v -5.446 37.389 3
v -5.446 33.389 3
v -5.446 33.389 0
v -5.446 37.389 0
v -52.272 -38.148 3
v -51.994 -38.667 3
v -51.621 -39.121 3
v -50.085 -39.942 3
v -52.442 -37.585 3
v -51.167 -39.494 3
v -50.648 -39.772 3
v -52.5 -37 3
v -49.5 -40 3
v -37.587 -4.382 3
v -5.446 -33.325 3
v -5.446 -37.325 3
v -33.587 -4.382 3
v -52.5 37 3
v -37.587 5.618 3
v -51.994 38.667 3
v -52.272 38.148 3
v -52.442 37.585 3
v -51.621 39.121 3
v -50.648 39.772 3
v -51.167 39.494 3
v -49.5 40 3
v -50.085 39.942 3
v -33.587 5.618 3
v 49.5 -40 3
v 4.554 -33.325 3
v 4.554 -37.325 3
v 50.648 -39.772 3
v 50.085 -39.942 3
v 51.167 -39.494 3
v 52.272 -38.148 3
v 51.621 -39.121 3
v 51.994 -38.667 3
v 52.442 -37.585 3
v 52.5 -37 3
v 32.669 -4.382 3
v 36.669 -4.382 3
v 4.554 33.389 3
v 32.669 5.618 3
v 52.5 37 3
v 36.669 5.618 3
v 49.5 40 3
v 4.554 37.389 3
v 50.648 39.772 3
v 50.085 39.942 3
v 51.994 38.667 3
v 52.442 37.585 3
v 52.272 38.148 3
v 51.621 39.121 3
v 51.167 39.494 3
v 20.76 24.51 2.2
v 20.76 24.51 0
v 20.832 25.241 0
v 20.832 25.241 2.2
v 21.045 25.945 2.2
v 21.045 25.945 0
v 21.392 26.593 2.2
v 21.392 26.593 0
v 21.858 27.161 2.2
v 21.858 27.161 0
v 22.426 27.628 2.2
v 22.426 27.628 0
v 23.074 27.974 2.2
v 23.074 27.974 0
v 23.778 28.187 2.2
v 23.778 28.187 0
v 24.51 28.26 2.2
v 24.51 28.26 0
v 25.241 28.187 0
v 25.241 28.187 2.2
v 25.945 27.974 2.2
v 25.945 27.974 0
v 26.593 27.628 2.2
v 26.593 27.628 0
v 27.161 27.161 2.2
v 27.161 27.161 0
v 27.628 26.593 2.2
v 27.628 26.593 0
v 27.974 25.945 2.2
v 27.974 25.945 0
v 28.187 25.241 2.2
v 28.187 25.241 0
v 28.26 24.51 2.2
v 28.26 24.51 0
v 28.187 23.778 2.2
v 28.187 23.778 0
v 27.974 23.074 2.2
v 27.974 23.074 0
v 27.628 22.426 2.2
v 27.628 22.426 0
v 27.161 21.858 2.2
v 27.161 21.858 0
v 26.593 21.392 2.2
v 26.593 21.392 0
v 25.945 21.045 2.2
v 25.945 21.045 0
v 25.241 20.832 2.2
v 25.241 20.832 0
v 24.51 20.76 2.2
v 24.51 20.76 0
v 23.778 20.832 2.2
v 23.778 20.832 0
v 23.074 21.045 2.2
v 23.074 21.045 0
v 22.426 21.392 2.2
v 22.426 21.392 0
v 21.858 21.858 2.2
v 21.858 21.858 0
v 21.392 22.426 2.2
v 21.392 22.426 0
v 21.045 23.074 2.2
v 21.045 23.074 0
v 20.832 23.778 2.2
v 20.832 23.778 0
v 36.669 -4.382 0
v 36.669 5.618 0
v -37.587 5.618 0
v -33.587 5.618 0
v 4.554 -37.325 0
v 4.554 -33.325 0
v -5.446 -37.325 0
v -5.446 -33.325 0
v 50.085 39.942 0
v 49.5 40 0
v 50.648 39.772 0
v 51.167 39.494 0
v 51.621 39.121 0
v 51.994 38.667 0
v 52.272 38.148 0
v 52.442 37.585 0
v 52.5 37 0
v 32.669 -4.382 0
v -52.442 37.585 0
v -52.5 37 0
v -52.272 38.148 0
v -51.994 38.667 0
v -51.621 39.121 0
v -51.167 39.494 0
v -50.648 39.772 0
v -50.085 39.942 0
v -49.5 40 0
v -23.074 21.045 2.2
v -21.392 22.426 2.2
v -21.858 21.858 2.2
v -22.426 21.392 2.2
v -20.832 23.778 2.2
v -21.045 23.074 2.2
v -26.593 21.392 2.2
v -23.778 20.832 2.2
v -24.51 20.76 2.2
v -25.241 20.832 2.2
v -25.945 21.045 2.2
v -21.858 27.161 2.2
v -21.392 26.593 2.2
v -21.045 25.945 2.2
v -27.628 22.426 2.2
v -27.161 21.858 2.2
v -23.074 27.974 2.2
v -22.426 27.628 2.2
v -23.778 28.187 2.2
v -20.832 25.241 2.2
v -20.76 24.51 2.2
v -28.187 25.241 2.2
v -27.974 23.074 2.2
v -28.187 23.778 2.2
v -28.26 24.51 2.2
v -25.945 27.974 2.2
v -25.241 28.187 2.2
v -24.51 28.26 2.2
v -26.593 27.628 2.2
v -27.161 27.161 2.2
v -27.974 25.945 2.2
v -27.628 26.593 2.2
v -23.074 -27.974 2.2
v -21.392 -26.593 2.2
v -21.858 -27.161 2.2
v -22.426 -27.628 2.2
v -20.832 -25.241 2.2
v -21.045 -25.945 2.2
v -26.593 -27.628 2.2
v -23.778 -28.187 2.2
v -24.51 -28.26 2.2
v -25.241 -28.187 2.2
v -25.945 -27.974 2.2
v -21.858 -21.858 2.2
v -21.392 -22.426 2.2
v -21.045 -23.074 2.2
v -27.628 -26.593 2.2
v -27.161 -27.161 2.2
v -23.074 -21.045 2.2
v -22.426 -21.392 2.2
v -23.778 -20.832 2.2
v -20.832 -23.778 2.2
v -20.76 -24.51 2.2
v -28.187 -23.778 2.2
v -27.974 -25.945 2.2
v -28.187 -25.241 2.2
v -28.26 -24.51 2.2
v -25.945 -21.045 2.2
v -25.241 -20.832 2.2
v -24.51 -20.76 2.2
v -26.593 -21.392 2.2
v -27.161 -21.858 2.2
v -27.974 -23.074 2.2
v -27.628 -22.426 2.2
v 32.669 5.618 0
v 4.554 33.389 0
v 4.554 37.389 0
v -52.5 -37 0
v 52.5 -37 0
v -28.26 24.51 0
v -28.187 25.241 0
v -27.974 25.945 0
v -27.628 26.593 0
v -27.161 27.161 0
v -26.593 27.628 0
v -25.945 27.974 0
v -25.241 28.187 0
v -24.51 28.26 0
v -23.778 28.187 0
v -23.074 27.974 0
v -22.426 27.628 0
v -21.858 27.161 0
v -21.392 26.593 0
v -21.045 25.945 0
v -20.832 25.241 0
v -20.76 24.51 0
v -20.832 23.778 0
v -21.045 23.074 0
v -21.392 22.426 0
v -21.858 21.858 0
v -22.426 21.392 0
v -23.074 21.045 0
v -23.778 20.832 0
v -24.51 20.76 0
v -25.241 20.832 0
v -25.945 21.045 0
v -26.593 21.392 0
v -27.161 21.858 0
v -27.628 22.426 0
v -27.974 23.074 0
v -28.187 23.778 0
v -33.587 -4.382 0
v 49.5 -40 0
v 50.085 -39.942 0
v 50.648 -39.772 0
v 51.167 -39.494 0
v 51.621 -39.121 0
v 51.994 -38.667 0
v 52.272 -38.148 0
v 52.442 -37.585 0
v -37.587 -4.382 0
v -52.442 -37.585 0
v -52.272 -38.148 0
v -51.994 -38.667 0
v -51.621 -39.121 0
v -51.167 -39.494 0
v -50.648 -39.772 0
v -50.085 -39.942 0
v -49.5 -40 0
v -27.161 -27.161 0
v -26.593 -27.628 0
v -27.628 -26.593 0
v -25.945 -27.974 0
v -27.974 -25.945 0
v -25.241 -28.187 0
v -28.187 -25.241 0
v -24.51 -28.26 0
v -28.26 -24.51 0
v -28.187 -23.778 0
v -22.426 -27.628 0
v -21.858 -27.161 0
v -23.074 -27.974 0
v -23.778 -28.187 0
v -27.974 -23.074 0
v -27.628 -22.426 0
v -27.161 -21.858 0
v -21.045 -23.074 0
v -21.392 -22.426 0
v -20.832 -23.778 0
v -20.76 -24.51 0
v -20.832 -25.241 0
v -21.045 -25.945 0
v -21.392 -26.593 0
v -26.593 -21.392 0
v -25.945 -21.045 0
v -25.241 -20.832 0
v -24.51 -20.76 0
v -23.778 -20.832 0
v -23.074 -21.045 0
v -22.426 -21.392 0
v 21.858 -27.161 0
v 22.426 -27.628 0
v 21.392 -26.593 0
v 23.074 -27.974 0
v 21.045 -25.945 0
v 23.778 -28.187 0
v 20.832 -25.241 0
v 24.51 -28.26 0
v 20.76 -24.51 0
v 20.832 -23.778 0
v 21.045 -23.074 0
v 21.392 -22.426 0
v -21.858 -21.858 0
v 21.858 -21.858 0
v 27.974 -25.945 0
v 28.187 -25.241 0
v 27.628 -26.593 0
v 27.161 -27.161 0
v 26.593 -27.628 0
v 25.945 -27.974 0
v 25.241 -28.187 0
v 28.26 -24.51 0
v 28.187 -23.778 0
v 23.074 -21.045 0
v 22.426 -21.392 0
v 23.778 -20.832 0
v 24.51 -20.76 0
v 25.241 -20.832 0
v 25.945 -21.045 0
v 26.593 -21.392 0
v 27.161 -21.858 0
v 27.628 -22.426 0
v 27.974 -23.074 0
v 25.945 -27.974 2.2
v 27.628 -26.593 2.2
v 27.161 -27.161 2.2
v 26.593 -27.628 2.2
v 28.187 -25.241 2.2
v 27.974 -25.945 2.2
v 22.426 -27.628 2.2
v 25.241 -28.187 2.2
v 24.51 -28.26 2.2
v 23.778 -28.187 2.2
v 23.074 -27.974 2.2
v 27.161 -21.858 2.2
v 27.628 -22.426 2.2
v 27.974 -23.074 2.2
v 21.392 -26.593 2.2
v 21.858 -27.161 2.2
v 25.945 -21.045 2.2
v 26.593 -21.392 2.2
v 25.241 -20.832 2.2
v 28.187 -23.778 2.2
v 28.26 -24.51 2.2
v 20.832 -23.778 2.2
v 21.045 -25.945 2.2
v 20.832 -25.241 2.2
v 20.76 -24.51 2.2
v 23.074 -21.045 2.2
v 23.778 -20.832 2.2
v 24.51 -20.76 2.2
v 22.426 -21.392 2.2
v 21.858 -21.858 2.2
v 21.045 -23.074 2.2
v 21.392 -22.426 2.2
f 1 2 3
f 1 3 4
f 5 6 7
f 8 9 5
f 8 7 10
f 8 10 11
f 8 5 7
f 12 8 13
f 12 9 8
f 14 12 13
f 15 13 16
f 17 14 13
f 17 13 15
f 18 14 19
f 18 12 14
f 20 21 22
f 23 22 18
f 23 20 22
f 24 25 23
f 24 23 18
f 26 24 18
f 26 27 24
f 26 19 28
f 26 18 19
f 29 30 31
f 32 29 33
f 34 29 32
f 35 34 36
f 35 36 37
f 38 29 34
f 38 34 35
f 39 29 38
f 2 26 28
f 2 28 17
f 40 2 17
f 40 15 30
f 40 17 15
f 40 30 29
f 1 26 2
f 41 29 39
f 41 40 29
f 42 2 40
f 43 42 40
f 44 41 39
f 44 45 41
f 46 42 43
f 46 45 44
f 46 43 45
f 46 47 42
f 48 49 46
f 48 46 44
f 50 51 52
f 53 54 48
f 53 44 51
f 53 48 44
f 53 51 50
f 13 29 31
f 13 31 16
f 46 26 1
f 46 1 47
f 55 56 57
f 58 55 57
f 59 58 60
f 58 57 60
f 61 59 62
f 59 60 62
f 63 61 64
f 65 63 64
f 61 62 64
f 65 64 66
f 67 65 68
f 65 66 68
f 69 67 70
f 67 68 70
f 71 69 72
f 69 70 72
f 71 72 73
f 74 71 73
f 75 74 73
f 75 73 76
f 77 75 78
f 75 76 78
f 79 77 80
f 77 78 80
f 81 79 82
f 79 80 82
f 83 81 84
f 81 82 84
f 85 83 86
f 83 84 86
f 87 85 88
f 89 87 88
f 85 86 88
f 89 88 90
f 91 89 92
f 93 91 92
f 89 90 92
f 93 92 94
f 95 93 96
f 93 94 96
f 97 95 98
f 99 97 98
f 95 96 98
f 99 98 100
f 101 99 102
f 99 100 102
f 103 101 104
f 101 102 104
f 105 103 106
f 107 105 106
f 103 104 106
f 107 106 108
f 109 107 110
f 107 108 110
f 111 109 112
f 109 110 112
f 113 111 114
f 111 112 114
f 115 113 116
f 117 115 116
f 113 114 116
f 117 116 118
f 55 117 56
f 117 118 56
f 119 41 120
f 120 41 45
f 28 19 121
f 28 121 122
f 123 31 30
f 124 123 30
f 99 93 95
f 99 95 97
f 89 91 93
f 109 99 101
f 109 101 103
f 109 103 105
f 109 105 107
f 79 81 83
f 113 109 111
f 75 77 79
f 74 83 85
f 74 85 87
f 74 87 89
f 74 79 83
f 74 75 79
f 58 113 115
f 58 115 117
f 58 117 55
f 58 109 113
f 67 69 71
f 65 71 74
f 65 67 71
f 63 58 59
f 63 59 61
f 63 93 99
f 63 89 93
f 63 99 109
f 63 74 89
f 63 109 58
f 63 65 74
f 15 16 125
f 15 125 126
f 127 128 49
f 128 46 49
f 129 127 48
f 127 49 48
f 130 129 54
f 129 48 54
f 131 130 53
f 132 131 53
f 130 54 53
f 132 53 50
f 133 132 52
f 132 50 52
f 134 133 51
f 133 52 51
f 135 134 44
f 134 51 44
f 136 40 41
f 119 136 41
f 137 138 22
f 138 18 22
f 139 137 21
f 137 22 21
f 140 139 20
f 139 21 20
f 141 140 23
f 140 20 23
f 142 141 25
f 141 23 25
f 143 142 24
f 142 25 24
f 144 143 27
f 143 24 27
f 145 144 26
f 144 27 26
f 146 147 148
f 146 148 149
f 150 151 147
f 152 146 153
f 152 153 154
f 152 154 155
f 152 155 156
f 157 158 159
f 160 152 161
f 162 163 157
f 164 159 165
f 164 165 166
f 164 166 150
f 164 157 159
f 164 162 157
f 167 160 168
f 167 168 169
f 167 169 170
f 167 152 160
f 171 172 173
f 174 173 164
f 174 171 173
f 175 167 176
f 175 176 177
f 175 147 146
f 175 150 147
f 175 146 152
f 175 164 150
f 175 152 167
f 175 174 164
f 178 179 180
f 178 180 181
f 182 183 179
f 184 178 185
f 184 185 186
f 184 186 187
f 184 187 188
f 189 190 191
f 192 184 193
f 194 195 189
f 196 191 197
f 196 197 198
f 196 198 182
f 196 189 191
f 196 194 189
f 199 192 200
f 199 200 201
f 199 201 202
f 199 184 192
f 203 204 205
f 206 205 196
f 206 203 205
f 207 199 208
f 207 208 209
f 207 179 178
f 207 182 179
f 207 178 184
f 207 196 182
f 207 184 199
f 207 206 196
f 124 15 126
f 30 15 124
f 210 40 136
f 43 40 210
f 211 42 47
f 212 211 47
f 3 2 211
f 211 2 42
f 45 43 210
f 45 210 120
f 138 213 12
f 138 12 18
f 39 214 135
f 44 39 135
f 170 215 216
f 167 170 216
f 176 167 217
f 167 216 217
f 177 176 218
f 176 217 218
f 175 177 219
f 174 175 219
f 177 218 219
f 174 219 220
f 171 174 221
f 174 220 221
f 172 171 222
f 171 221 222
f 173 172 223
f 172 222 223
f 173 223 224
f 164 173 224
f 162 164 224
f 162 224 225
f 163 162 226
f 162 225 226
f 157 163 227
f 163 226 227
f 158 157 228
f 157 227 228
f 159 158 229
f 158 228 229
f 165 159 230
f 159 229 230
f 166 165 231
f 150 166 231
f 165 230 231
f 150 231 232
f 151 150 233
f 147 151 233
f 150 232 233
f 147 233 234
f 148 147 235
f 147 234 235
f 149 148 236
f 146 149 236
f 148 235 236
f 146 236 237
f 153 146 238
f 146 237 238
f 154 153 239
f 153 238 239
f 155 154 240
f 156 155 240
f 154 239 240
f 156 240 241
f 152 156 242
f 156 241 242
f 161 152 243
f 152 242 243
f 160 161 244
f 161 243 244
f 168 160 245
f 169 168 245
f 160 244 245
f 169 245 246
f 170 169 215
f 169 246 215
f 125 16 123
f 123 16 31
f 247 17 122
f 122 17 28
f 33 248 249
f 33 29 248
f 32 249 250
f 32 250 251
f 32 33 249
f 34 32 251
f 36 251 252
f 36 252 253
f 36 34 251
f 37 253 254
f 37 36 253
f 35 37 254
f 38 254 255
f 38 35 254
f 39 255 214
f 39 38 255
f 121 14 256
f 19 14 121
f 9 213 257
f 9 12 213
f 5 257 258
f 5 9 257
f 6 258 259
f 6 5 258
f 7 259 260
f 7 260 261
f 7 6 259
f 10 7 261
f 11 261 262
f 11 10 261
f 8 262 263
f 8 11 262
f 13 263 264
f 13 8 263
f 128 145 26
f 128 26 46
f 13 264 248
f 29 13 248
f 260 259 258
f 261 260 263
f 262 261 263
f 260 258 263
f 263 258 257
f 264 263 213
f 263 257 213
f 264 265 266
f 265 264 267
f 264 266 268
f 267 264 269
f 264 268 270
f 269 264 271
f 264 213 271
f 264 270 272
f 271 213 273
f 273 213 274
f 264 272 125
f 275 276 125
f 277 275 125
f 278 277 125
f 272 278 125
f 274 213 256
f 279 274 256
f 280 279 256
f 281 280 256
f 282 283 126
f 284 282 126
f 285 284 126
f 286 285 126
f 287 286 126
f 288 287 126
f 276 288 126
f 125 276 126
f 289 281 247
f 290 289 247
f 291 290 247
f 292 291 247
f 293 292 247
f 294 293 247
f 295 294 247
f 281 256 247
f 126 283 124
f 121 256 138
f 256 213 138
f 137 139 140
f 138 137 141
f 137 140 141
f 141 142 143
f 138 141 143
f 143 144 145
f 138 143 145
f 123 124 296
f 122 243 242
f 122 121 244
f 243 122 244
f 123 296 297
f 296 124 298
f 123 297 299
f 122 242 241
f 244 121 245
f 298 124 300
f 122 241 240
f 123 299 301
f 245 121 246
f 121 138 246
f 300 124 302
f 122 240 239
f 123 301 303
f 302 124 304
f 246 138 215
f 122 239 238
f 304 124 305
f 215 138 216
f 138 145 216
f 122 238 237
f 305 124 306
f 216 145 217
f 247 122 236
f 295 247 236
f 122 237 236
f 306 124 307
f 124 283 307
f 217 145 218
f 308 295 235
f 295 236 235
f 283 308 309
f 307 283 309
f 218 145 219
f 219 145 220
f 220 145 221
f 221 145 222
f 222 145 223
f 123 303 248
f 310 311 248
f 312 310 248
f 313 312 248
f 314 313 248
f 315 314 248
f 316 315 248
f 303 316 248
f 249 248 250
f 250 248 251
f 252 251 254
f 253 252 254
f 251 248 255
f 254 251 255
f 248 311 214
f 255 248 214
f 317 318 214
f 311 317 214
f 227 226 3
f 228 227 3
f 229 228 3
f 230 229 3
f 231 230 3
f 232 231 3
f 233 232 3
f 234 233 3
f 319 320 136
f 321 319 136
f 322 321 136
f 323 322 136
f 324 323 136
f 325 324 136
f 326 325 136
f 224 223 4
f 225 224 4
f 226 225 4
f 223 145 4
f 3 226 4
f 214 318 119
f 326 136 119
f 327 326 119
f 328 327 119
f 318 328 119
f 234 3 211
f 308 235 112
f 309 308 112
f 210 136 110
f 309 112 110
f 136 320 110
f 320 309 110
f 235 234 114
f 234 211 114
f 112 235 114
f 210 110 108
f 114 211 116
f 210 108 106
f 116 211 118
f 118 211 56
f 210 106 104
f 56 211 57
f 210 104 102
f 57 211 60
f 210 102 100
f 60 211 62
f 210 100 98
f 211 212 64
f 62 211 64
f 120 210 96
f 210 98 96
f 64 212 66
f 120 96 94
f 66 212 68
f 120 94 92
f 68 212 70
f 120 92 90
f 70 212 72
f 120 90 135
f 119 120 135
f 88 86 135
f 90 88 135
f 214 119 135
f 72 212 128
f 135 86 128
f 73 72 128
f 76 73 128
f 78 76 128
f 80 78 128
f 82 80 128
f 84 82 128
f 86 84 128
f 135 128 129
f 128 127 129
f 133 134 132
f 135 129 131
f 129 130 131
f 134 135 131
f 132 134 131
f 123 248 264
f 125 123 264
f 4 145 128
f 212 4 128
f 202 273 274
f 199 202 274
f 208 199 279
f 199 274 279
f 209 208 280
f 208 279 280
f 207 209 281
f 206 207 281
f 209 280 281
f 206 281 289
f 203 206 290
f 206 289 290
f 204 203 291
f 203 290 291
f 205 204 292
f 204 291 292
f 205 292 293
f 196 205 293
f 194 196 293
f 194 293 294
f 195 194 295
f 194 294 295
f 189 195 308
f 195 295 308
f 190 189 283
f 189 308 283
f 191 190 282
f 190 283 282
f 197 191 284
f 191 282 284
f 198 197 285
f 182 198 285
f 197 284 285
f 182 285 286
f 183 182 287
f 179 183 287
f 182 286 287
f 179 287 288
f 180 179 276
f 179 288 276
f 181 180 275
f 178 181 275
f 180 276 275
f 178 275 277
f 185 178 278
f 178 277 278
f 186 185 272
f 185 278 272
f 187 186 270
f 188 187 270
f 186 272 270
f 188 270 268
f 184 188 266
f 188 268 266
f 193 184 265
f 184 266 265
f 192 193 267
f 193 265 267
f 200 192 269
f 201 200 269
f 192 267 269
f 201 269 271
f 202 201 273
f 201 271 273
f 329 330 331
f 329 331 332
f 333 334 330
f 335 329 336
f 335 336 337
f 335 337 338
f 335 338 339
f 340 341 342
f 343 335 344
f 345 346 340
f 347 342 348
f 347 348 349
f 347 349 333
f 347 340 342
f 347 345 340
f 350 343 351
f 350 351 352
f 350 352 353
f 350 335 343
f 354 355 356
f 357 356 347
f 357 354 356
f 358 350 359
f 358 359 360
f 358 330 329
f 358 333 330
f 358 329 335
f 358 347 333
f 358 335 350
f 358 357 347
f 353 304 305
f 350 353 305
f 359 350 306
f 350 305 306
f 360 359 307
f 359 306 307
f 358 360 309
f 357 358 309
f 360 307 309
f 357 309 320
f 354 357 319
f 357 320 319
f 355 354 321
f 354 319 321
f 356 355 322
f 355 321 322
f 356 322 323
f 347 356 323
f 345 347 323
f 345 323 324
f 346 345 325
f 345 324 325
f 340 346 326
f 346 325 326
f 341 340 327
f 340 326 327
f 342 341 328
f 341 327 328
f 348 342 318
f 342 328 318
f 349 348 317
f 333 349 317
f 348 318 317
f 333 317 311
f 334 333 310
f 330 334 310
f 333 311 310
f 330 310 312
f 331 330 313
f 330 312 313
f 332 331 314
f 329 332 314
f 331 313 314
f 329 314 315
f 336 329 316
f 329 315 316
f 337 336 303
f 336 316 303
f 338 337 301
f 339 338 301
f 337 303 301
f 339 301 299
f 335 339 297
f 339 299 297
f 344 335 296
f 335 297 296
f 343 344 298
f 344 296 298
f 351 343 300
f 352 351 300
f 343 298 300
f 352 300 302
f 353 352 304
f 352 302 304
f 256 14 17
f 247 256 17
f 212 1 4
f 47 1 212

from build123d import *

# Parameters (mm, degrees)
SKETCH1_W           = 105
SKETCH1_H           = 80
BOSS_EXTRUDE1_DEPTH = 3
SKETCH3_R           = 3.75
CUT_EXTRUDE1_DEPTH  = 2.2
SKETCH4_W           = 10
SKETCH4_H           = 4
SKETCH4_W_2         = 4
SKETCH4_H_2         = 10
CUT_EXTRUDE2_DEPTH  = 10
FILLET2_R           = 3
FILLET3_R           = 3


with BuildPart() as part:
    # Sketch1 → Boss-Extrude1 (new body)
    with BuildSketch(Plane.XY):
        Rectangle(SKETCH1_W, SKETCH1_H)
    extrude(amount=BOSS_EXTRUDE1_DEPTH)

    # Sketch3 → Cut-Extrude1 (cut)
    with BuildSketch(Plane(origin=(0, 0, 0), x_dir=(-1, 0, 0), z_dir=(0, 0, -1))):
        with Locations((-24.509514806, 24.509514806)):
            Circle(SKETCH3_R)
        with Locations((24.509514806, 24.509514806)):
            Circle(SKETCH3_R)
        with Locations((24.509514806, -24.509514806)):
            Circle(SKETCH3_R)
        with Locations((-24.509514806, -24.509514806)):
            Circle(SKETCH3_R)
    extrude(amount=-CUT_EXTRUDE1_DEPTH, mode=Mode.SUBTRACT)

    # Sketch4 → Cut-Extrude2 (cut)
    with BuildSketch(Plane.XY.offset(3)):
        with Locations((-0.446296315, 35.38913846)):
            Rectangle(SKETCH4_W, SKETCH4_H)
        with Locations((-0.446296315, -35.324542102)):
            Rectangle(SKETCH4_W, SKETCH4_H)
        with Locations((-35.586810408, 0.617671805)):
            Rectangle(SKETCH4_W_2, SKETCH4_H_2)
        with Locations((34.669298403, 0.617671805)):
            Rectangle(SKETCH4_W_2, SKETCH4_H_2)
    extrude(amount=-CUT_EXTRUDE2_DEPTH, mode=Mode.SUBTRACT)

    # Fillet2
    fillet2_edges = [part.edges().sort_by_distance(p)[0] for p in [
        (-52.5, -40, 1.5),
    ]]
    fillet(fillet2_edges, radius=FILLET2_R)

    # Fillet3
    fillet3_edges = [part.edges().sort_by_distance(p)[0] for p in [
        (-52.5, 40, 1.5),
        (52.5, 40, 1.5),
        (52.5, -40, 1.5),
    ]]
    fillet(fillet3_edges, radius=FILLET3_R)


solid = part.part
